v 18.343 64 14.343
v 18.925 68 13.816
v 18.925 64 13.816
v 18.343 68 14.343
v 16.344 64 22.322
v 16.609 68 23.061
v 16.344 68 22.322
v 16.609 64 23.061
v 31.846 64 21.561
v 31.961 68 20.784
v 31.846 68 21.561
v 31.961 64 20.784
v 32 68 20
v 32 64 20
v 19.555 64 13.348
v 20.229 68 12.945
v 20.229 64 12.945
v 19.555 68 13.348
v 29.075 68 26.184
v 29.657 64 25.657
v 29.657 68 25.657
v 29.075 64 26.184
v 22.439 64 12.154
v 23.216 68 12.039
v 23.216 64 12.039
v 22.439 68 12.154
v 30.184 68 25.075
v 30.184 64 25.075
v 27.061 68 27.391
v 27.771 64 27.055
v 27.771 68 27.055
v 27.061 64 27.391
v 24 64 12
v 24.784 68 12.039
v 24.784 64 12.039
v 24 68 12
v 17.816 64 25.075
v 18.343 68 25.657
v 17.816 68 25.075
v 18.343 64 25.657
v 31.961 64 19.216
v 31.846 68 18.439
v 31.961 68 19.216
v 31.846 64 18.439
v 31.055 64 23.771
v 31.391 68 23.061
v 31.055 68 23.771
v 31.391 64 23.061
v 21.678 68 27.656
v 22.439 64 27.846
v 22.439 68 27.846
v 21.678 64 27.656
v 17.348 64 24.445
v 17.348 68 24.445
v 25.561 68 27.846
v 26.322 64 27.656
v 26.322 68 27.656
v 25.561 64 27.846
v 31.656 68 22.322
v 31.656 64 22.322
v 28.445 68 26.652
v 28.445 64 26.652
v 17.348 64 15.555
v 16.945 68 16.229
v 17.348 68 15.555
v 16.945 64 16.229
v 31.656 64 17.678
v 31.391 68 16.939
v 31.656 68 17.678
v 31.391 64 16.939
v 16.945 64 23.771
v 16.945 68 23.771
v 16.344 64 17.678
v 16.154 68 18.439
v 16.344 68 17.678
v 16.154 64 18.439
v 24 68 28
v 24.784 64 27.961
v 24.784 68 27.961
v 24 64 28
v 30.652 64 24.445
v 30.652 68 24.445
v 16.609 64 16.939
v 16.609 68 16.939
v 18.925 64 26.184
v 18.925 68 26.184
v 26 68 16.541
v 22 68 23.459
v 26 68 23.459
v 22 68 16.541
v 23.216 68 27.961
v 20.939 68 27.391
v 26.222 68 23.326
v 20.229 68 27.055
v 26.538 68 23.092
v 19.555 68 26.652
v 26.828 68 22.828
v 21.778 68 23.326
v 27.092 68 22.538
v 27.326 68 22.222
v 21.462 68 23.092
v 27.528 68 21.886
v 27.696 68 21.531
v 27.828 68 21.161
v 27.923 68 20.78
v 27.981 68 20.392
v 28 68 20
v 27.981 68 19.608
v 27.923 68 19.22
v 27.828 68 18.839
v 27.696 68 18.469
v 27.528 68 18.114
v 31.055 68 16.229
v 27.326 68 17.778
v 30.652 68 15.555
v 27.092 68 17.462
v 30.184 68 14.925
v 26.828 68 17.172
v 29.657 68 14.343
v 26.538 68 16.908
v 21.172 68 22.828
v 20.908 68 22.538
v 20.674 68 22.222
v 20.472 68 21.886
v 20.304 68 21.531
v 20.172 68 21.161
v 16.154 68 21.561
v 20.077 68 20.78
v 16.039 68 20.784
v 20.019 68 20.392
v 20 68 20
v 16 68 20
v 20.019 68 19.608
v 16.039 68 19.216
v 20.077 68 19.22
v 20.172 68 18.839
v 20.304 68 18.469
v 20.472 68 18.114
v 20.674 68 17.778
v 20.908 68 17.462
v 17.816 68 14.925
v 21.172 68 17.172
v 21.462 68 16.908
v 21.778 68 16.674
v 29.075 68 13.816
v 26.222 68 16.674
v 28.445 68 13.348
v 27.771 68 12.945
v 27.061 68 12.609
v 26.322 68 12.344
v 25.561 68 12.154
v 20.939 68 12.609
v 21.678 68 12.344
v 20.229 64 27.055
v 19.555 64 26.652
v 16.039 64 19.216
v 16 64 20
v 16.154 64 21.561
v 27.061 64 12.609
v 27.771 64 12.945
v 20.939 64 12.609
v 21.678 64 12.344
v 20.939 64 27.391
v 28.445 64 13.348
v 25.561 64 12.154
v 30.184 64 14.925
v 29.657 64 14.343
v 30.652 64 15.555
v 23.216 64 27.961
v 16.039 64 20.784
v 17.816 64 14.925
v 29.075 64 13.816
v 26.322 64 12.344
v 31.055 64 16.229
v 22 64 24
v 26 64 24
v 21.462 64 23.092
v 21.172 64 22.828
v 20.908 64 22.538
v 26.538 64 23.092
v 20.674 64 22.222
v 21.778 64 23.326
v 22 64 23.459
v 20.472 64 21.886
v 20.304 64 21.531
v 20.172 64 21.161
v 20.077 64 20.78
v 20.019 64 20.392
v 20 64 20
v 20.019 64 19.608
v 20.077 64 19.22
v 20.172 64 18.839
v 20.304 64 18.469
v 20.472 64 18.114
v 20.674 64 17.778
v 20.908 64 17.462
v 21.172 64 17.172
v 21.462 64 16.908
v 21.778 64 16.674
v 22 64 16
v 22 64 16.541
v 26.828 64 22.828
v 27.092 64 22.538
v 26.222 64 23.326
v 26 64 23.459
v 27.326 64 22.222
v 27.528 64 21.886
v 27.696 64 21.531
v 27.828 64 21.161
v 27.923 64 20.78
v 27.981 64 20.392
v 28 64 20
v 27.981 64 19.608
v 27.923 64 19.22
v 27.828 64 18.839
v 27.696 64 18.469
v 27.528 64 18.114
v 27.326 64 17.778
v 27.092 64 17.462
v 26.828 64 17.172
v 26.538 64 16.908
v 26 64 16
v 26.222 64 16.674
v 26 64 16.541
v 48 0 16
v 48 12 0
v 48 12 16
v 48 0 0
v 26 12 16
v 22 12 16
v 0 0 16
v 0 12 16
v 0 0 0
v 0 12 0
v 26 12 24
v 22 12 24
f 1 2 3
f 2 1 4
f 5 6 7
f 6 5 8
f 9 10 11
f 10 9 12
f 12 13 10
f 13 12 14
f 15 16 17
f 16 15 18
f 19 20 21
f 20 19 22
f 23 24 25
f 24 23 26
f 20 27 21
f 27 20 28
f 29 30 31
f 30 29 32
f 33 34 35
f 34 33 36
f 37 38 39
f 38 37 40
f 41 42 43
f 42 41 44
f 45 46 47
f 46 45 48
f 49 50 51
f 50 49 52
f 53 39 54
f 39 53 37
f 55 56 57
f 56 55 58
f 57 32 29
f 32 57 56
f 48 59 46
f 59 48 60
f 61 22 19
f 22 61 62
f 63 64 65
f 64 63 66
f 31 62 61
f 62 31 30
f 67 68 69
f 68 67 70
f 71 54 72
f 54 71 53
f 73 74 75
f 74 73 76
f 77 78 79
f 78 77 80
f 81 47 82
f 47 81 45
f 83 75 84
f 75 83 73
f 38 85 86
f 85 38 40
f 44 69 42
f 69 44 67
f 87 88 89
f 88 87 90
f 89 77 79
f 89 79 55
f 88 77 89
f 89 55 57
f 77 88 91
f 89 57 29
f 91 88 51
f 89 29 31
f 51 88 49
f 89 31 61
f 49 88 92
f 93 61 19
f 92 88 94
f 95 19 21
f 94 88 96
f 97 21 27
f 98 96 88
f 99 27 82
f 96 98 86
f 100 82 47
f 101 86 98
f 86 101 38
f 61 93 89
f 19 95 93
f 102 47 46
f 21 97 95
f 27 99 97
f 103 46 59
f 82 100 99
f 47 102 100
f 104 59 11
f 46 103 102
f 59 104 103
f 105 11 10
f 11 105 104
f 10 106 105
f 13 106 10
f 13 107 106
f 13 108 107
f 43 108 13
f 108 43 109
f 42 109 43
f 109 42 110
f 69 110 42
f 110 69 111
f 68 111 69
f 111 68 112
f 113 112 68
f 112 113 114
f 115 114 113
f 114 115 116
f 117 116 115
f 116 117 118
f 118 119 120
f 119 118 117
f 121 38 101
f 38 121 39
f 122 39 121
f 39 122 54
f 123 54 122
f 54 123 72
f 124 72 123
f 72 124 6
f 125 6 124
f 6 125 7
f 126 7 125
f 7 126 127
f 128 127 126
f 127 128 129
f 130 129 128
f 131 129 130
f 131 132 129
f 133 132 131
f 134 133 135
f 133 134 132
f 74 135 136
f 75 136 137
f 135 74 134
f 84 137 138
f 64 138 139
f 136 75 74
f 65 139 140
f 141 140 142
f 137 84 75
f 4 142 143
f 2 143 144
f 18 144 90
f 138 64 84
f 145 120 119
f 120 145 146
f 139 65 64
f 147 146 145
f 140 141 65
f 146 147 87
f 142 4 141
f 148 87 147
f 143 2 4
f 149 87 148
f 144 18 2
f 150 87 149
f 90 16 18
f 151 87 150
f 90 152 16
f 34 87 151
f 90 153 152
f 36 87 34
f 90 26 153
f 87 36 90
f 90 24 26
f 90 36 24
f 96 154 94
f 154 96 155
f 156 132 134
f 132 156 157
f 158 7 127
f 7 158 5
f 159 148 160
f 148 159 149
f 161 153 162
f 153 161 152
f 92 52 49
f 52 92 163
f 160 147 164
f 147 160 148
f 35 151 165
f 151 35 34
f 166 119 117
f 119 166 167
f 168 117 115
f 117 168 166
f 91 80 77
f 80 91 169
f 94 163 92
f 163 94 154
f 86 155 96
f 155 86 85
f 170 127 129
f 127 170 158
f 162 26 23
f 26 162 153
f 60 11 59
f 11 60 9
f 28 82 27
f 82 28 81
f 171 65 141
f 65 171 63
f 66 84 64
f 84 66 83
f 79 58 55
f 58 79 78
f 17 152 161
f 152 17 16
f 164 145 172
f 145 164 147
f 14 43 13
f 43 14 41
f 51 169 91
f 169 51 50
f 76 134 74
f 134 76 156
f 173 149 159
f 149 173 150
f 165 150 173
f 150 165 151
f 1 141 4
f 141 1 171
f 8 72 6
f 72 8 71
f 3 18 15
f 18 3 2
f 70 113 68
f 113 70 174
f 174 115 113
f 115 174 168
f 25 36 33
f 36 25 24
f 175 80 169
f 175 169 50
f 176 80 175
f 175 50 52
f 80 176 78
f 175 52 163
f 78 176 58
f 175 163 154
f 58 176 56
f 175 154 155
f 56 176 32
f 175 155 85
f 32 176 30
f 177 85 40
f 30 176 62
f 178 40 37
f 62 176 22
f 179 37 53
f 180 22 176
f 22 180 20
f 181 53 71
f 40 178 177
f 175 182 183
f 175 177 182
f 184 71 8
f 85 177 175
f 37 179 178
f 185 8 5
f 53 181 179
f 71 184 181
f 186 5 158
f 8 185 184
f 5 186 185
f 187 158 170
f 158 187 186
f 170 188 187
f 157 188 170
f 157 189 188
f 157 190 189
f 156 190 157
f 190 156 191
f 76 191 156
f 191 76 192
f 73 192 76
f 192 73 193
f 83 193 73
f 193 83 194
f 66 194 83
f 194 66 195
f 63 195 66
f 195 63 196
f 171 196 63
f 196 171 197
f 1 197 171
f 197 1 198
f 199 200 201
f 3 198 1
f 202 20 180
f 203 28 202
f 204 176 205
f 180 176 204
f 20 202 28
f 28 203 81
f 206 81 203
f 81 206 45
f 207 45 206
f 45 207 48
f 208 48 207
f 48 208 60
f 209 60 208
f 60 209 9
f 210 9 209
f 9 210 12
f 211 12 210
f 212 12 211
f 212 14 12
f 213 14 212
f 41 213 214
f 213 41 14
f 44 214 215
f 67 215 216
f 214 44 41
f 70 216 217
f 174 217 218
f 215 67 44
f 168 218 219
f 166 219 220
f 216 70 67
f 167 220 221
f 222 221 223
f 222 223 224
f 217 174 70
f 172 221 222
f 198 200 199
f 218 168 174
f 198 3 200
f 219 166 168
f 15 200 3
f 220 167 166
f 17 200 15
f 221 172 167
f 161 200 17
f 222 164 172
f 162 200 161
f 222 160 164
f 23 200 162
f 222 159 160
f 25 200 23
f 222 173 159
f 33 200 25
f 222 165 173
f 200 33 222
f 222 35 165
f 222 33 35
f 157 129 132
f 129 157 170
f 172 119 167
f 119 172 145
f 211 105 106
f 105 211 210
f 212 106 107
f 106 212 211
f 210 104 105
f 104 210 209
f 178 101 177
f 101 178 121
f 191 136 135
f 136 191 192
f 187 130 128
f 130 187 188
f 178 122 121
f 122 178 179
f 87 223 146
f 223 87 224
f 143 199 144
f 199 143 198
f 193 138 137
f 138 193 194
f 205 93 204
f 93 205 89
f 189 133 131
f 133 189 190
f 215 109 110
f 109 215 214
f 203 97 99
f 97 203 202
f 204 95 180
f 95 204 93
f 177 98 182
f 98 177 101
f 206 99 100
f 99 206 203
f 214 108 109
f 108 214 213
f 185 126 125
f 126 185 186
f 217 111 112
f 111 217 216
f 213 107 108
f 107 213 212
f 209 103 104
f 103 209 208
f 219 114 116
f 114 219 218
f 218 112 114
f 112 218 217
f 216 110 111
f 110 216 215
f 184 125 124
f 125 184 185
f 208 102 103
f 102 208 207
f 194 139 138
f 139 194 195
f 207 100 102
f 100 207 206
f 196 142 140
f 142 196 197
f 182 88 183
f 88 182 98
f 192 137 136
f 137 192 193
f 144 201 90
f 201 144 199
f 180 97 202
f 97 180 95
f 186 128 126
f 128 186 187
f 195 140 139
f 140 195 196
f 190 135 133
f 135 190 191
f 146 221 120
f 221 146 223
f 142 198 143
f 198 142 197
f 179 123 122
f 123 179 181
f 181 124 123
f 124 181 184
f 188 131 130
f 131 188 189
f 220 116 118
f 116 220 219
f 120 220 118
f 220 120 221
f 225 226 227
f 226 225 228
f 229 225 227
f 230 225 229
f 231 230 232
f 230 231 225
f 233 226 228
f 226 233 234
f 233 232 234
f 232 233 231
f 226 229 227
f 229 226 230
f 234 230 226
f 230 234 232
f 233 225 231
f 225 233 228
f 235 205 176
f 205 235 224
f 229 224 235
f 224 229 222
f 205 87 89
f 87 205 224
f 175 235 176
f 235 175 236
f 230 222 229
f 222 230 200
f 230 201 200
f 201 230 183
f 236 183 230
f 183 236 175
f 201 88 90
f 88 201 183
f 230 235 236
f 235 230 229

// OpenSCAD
// Universal parameters
width = 80;   // overall size
wall = 4;    // thickness

$fn = 64;

// --- Mounting base ---
base_width = width * 0.6;
base_height = wall * 4;

cube([base_width, wall * 3, base_height]);

// --- Cantilever arm ---
arm_length = width * 0.7;
arm_height = wall * 2;

translate([base_width/2 - wall/2, wall * 3, base_height])
cube([wall, arm_length, arm_height]);

// --- Retention curve (prevents slip) ---
translate([base_width/2, wall * 3 + arm_length, base_height + arm_height/2])
rotate([90,0,0])
difference() {
    cylinder(h=wall, r=wall*2);
    translate([0,0,-1])
        cylinder(h=wall+2, r=wall);
}
